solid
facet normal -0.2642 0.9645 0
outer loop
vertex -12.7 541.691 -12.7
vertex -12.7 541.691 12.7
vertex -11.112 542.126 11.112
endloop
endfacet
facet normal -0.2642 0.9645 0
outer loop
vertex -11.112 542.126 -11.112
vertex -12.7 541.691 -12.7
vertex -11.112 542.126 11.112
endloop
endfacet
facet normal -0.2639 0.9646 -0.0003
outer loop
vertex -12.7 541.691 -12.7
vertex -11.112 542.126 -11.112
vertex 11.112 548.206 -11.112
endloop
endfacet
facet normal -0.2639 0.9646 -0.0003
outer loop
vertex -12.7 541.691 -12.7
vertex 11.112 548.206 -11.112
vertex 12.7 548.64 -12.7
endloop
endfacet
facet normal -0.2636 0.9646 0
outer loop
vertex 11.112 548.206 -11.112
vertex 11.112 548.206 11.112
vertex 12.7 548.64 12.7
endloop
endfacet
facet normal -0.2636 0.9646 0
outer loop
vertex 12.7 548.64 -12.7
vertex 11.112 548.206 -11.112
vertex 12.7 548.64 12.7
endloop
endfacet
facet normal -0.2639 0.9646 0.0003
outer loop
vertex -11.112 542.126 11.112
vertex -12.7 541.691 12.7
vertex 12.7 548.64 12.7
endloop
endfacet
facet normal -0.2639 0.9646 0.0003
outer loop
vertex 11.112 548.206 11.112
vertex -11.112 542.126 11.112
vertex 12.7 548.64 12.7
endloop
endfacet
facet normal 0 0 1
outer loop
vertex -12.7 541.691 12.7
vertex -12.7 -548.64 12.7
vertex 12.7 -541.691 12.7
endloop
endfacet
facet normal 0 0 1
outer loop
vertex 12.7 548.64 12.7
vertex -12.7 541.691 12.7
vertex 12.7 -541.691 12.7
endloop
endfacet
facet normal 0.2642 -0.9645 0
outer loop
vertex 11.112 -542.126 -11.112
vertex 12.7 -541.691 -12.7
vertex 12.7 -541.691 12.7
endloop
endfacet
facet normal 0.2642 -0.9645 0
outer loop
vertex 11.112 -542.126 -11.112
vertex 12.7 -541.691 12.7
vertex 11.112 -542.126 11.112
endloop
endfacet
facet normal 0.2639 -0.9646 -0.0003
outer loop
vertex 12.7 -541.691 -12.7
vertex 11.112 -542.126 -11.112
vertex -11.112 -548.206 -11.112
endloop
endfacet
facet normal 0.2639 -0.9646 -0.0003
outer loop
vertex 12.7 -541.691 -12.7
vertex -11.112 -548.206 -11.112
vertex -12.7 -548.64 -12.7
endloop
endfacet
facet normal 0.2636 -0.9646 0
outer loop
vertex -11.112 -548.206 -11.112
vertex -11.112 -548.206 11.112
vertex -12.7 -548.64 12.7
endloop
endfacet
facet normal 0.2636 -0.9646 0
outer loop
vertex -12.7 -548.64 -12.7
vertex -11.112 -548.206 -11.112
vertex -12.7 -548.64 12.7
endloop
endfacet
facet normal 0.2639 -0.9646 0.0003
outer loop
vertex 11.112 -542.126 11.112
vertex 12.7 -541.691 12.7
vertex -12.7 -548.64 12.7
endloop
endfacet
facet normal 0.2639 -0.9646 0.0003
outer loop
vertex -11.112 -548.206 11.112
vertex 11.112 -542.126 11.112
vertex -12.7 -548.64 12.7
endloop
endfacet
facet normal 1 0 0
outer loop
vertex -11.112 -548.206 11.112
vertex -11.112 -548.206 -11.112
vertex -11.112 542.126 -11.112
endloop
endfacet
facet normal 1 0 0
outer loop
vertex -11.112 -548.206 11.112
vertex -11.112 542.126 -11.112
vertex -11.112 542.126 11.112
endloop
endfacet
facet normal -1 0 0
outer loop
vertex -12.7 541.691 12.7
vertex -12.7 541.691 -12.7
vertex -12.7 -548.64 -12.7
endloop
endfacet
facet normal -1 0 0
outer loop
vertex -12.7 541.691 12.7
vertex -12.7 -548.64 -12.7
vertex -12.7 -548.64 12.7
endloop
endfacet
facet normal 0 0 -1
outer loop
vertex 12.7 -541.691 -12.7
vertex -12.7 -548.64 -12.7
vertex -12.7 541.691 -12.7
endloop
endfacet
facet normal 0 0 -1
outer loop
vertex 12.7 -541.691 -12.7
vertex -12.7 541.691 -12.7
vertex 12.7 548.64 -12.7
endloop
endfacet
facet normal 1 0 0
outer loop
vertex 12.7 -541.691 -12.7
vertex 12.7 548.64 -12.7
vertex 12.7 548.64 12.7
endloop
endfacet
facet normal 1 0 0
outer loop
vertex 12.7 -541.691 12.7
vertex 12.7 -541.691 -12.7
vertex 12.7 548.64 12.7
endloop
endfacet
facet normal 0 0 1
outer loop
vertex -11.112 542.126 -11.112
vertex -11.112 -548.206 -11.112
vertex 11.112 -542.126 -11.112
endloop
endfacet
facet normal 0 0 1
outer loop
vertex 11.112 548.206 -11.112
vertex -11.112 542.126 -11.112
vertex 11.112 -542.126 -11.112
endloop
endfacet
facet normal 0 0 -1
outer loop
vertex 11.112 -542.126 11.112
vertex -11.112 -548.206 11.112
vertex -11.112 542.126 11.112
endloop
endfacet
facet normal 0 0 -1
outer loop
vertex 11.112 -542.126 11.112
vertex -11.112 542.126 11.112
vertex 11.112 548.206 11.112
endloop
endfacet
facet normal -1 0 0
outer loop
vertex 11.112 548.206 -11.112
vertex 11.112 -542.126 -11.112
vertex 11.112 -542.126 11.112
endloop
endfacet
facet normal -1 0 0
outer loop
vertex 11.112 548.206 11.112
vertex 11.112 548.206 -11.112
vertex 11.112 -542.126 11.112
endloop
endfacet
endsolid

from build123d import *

# Parameters (mm, degrees)
F0_W     = 25.4
F0_H     = 25.4
F0_W_2   = 22.225
F0_H_2   = 22.225
F1_DEPTH = 548.64
F3_DEPTH = 25.401
F5_DEPTH = 25.401


with BuildPart() as f1:
    # F0 (on Front) → F1 (new body, symmetric)
    with BuildSketch(Plane.XZ):
        Rectangle(F0_W, F0_H)
        Rectangle(F0_W_2, F0_H_2, mode=Mode.SUBTRACT)
    extrude(amount=F1_DEPTH, both=True)

    # F2 (on face) → F3 (cut, through all)
    with BuildSketch(Plane.XY.offset(12.7)):
        Polygon((12.7, 548.64), (-12.7, 548.64), (-12.7, 541.691346), align=None)
    extrude(amount=-F3_DEPTH, mode=Mode.SUBTRACT)

    # F4 (on face) → F5 (cut, through all)
    with BuildSketch(Plane.XY.offset(12.7)):
        Polygon((12.7, -541.691346), (-12.7, -548.64), (12.7, -548.64), align=None)
    extrude(amount=-F5_DEPTH, mode=Mode.SUBTRACT)


solid = f1.part
